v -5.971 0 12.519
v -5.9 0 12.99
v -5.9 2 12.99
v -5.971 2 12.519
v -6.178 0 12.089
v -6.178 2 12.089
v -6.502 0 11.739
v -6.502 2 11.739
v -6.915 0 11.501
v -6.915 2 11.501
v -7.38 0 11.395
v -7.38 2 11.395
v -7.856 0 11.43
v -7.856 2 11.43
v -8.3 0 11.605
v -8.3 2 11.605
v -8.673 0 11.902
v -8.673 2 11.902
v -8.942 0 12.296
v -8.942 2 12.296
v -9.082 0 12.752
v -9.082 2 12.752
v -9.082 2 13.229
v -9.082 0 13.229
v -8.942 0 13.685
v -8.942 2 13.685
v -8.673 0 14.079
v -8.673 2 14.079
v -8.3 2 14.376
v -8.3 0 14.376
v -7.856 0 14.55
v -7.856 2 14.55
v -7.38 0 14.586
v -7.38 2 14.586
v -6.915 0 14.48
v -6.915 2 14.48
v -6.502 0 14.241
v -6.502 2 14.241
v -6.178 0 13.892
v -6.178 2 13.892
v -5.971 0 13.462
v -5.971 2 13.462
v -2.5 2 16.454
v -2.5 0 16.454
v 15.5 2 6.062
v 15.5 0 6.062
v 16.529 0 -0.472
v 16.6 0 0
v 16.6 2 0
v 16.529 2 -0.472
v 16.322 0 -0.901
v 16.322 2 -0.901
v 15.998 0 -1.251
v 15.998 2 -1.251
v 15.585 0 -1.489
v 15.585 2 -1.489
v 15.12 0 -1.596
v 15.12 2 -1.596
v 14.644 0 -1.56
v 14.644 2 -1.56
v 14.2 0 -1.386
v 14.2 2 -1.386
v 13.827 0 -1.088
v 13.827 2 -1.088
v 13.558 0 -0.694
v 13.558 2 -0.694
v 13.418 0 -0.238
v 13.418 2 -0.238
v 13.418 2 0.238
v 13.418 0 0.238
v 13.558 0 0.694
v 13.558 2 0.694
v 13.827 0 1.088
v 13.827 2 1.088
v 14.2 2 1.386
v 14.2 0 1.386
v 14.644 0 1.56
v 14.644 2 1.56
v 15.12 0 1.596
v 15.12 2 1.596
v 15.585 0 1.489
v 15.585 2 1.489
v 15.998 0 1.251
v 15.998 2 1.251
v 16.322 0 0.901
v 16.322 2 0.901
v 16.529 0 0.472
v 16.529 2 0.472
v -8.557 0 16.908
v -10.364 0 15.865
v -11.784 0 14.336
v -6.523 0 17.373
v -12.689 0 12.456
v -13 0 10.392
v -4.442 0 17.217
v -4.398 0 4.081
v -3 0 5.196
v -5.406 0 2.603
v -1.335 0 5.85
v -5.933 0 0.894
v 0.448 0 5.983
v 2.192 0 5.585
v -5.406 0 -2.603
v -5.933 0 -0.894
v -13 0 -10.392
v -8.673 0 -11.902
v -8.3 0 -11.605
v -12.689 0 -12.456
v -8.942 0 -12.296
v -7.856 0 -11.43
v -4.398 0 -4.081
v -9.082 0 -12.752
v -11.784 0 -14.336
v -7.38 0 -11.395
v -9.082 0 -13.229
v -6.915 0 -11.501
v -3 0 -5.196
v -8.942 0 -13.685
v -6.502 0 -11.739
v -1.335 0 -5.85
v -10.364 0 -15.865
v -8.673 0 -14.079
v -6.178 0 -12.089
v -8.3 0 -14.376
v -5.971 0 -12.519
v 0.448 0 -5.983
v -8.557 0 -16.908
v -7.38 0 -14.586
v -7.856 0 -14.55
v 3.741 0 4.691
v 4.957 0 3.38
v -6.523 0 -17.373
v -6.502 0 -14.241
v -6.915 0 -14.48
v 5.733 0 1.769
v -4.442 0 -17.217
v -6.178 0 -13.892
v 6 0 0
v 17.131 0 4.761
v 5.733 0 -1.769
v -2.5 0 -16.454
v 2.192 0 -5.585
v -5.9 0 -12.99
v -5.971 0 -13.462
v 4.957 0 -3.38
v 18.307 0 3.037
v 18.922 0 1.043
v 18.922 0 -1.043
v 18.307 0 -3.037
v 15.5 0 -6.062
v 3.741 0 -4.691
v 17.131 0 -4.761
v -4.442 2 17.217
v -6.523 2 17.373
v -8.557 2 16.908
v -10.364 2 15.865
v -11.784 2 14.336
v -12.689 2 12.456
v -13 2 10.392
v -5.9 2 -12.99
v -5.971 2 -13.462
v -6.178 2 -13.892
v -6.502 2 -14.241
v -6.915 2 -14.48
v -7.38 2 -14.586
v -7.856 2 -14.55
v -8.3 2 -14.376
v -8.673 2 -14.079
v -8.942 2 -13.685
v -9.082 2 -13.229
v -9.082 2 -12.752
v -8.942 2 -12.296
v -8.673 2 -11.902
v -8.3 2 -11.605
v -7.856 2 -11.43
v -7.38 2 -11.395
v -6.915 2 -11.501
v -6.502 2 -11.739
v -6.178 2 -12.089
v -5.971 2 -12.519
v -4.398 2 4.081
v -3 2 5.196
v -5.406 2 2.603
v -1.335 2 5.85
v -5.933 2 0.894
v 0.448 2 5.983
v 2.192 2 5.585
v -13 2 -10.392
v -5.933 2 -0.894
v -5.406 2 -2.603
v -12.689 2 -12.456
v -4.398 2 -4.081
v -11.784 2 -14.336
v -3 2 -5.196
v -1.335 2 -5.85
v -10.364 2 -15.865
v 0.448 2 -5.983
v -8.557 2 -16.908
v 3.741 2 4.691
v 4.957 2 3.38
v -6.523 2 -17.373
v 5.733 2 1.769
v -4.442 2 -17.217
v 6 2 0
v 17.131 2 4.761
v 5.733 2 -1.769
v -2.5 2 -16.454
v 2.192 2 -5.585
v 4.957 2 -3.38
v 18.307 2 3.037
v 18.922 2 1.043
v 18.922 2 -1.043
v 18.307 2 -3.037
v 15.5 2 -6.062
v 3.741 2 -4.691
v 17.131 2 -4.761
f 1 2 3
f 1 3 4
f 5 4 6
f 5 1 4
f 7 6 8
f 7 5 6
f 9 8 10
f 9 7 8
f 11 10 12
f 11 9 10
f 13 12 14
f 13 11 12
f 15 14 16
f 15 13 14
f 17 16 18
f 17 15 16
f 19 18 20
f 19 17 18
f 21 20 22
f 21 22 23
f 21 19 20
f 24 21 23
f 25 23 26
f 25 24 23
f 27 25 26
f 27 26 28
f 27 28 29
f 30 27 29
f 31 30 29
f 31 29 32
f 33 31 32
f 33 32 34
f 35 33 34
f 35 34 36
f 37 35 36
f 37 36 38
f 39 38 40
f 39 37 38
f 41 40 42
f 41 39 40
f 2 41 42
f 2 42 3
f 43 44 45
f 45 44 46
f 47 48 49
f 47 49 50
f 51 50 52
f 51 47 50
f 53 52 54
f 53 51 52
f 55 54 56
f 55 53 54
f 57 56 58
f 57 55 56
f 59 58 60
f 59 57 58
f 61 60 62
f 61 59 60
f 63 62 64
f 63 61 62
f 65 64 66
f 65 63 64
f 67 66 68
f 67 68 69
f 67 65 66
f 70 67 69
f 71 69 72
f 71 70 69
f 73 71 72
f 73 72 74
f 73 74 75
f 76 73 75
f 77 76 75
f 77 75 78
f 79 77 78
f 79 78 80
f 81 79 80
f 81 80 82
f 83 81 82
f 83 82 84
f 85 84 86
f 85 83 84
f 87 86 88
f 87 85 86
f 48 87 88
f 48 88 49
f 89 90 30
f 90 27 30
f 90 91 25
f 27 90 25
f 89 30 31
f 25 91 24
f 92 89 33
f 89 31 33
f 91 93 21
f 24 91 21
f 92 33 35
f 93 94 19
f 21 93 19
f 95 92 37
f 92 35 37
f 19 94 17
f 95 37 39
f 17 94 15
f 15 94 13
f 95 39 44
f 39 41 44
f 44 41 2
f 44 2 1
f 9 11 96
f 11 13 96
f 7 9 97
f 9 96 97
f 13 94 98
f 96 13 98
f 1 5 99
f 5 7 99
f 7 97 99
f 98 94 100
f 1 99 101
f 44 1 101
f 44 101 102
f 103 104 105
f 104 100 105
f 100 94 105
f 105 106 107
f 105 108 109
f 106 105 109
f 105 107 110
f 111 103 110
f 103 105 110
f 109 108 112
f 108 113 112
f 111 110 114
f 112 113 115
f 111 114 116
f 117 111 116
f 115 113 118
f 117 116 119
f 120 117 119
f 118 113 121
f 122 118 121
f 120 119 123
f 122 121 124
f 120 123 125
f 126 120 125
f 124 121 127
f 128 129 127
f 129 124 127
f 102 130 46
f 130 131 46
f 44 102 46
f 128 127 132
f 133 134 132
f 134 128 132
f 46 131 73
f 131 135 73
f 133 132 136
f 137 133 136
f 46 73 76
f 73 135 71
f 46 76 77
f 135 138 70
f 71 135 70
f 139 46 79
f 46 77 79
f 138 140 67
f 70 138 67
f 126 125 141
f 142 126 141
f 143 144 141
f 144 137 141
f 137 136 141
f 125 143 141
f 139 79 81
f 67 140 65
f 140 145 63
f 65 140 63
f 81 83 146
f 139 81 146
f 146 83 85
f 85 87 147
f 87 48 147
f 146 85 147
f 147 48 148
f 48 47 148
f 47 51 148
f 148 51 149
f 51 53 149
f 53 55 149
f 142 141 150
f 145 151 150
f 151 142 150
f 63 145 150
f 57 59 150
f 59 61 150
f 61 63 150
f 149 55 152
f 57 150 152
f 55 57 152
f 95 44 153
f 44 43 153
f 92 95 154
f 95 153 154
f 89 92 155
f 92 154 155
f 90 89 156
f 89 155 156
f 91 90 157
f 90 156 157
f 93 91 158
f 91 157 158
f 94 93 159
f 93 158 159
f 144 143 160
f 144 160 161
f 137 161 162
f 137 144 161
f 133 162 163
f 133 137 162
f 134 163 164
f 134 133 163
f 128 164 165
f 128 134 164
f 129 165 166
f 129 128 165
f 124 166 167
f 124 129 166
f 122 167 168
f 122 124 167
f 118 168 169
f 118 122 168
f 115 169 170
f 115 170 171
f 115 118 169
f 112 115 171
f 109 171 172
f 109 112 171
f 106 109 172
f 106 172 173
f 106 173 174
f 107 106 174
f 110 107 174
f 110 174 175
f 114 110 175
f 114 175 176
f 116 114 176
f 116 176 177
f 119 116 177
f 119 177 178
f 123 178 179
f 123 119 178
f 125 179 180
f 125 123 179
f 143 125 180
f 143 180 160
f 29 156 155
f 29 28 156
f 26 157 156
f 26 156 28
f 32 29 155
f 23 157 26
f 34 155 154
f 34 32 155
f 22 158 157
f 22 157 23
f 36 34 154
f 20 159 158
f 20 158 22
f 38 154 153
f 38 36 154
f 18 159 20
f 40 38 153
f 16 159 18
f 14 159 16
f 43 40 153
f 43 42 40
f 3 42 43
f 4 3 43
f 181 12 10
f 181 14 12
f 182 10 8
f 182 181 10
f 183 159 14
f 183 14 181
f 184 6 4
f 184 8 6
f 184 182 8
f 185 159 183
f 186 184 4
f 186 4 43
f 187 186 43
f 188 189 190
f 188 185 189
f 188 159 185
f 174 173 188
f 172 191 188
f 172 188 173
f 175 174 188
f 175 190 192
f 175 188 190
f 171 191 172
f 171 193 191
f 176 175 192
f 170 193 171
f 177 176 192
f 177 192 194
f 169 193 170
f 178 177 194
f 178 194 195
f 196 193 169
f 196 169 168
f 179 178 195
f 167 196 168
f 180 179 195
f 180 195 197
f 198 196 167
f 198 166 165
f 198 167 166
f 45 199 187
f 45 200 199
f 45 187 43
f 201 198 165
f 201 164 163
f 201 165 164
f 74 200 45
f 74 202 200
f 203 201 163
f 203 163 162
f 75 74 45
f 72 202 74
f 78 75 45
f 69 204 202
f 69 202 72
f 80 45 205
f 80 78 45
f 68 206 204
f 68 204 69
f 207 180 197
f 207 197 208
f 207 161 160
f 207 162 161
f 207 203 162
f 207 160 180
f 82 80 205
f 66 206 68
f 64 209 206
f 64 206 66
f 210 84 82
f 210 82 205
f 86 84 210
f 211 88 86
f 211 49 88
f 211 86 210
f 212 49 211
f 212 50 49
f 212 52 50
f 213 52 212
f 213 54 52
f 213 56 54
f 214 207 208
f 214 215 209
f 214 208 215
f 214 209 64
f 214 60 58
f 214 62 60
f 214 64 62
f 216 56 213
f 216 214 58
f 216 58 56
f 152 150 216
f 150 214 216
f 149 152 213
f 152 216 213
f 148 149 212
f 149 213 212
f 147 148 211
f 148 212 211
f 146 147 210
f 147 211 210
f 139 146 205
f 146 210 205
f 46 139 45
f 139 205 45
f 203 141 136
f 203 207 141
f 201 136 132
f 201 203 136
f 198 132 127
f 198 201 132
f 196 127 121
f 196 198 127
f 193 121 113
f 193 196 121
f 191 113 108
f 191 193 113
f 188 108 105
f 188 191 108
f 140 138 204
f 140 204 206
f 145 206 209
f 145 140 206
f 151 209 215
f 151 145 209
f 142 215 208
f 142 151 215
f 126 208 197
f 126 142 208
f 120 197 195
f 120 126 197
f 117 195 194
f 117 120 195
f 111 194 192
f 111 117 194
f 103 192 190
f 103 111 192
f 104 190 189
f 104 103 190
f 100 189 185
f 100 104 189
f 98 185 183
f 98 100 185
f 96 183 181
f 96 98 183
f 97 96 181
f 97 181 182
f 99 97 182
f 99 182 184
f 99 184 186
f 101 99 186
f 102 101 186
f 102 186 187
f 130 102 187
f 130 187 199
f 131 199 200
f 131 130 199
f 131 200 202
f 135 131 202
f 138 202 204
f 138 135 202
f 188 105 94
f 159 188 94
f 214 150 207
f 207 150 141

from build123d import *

# Parameters (mm, degrees)
SKETCH1_R           = 1.6
SKETCH1_R_2         = 6
BOSS_EXTRUDE1_DEPTH = 2
FILLET1_R           = 7


with BuildPart() as part:
    # Sketch1 → Boss-Extrude1 (new body)
    with BuildSketch(Plane(origin=(0, 0, 0), x_dir=(1, 0, 0), z_dir=(0, 1, 0))):
        Polygon((26, 0), (-13, 22.516660498), (-13, -22.516660498), align=None)
        with Locations((-7.5, 12.990381057)):
            Circle(SKETCH1_R, mode=Mode.SUBTRACT)
        with Locations((15, 0)):
            Circle(SKETCH1_R, mode=Mode.SUBTRACT)
        with Locations((-7.5, -12.990381057)):
            Circle(SKETCH1_R, mode=Mode.SUBTRACT)
        Circle(SKETCH1_R_2, mode=Mode.SUBTRACT)
    extrude(amount=BOSS_EXTRUDE1_DEPTH)

    # Fillet1
    fillet1_edges = [part.edges().sort_by_distance(p)[0] for p in [
        (-13, 1, 22.516660498),
        (-13, 1, -22.516660498),
        (26, 1, 0),
    ]]
    fillet(fillet1_edges, radius=FILLET1_R)


solid = part.part
